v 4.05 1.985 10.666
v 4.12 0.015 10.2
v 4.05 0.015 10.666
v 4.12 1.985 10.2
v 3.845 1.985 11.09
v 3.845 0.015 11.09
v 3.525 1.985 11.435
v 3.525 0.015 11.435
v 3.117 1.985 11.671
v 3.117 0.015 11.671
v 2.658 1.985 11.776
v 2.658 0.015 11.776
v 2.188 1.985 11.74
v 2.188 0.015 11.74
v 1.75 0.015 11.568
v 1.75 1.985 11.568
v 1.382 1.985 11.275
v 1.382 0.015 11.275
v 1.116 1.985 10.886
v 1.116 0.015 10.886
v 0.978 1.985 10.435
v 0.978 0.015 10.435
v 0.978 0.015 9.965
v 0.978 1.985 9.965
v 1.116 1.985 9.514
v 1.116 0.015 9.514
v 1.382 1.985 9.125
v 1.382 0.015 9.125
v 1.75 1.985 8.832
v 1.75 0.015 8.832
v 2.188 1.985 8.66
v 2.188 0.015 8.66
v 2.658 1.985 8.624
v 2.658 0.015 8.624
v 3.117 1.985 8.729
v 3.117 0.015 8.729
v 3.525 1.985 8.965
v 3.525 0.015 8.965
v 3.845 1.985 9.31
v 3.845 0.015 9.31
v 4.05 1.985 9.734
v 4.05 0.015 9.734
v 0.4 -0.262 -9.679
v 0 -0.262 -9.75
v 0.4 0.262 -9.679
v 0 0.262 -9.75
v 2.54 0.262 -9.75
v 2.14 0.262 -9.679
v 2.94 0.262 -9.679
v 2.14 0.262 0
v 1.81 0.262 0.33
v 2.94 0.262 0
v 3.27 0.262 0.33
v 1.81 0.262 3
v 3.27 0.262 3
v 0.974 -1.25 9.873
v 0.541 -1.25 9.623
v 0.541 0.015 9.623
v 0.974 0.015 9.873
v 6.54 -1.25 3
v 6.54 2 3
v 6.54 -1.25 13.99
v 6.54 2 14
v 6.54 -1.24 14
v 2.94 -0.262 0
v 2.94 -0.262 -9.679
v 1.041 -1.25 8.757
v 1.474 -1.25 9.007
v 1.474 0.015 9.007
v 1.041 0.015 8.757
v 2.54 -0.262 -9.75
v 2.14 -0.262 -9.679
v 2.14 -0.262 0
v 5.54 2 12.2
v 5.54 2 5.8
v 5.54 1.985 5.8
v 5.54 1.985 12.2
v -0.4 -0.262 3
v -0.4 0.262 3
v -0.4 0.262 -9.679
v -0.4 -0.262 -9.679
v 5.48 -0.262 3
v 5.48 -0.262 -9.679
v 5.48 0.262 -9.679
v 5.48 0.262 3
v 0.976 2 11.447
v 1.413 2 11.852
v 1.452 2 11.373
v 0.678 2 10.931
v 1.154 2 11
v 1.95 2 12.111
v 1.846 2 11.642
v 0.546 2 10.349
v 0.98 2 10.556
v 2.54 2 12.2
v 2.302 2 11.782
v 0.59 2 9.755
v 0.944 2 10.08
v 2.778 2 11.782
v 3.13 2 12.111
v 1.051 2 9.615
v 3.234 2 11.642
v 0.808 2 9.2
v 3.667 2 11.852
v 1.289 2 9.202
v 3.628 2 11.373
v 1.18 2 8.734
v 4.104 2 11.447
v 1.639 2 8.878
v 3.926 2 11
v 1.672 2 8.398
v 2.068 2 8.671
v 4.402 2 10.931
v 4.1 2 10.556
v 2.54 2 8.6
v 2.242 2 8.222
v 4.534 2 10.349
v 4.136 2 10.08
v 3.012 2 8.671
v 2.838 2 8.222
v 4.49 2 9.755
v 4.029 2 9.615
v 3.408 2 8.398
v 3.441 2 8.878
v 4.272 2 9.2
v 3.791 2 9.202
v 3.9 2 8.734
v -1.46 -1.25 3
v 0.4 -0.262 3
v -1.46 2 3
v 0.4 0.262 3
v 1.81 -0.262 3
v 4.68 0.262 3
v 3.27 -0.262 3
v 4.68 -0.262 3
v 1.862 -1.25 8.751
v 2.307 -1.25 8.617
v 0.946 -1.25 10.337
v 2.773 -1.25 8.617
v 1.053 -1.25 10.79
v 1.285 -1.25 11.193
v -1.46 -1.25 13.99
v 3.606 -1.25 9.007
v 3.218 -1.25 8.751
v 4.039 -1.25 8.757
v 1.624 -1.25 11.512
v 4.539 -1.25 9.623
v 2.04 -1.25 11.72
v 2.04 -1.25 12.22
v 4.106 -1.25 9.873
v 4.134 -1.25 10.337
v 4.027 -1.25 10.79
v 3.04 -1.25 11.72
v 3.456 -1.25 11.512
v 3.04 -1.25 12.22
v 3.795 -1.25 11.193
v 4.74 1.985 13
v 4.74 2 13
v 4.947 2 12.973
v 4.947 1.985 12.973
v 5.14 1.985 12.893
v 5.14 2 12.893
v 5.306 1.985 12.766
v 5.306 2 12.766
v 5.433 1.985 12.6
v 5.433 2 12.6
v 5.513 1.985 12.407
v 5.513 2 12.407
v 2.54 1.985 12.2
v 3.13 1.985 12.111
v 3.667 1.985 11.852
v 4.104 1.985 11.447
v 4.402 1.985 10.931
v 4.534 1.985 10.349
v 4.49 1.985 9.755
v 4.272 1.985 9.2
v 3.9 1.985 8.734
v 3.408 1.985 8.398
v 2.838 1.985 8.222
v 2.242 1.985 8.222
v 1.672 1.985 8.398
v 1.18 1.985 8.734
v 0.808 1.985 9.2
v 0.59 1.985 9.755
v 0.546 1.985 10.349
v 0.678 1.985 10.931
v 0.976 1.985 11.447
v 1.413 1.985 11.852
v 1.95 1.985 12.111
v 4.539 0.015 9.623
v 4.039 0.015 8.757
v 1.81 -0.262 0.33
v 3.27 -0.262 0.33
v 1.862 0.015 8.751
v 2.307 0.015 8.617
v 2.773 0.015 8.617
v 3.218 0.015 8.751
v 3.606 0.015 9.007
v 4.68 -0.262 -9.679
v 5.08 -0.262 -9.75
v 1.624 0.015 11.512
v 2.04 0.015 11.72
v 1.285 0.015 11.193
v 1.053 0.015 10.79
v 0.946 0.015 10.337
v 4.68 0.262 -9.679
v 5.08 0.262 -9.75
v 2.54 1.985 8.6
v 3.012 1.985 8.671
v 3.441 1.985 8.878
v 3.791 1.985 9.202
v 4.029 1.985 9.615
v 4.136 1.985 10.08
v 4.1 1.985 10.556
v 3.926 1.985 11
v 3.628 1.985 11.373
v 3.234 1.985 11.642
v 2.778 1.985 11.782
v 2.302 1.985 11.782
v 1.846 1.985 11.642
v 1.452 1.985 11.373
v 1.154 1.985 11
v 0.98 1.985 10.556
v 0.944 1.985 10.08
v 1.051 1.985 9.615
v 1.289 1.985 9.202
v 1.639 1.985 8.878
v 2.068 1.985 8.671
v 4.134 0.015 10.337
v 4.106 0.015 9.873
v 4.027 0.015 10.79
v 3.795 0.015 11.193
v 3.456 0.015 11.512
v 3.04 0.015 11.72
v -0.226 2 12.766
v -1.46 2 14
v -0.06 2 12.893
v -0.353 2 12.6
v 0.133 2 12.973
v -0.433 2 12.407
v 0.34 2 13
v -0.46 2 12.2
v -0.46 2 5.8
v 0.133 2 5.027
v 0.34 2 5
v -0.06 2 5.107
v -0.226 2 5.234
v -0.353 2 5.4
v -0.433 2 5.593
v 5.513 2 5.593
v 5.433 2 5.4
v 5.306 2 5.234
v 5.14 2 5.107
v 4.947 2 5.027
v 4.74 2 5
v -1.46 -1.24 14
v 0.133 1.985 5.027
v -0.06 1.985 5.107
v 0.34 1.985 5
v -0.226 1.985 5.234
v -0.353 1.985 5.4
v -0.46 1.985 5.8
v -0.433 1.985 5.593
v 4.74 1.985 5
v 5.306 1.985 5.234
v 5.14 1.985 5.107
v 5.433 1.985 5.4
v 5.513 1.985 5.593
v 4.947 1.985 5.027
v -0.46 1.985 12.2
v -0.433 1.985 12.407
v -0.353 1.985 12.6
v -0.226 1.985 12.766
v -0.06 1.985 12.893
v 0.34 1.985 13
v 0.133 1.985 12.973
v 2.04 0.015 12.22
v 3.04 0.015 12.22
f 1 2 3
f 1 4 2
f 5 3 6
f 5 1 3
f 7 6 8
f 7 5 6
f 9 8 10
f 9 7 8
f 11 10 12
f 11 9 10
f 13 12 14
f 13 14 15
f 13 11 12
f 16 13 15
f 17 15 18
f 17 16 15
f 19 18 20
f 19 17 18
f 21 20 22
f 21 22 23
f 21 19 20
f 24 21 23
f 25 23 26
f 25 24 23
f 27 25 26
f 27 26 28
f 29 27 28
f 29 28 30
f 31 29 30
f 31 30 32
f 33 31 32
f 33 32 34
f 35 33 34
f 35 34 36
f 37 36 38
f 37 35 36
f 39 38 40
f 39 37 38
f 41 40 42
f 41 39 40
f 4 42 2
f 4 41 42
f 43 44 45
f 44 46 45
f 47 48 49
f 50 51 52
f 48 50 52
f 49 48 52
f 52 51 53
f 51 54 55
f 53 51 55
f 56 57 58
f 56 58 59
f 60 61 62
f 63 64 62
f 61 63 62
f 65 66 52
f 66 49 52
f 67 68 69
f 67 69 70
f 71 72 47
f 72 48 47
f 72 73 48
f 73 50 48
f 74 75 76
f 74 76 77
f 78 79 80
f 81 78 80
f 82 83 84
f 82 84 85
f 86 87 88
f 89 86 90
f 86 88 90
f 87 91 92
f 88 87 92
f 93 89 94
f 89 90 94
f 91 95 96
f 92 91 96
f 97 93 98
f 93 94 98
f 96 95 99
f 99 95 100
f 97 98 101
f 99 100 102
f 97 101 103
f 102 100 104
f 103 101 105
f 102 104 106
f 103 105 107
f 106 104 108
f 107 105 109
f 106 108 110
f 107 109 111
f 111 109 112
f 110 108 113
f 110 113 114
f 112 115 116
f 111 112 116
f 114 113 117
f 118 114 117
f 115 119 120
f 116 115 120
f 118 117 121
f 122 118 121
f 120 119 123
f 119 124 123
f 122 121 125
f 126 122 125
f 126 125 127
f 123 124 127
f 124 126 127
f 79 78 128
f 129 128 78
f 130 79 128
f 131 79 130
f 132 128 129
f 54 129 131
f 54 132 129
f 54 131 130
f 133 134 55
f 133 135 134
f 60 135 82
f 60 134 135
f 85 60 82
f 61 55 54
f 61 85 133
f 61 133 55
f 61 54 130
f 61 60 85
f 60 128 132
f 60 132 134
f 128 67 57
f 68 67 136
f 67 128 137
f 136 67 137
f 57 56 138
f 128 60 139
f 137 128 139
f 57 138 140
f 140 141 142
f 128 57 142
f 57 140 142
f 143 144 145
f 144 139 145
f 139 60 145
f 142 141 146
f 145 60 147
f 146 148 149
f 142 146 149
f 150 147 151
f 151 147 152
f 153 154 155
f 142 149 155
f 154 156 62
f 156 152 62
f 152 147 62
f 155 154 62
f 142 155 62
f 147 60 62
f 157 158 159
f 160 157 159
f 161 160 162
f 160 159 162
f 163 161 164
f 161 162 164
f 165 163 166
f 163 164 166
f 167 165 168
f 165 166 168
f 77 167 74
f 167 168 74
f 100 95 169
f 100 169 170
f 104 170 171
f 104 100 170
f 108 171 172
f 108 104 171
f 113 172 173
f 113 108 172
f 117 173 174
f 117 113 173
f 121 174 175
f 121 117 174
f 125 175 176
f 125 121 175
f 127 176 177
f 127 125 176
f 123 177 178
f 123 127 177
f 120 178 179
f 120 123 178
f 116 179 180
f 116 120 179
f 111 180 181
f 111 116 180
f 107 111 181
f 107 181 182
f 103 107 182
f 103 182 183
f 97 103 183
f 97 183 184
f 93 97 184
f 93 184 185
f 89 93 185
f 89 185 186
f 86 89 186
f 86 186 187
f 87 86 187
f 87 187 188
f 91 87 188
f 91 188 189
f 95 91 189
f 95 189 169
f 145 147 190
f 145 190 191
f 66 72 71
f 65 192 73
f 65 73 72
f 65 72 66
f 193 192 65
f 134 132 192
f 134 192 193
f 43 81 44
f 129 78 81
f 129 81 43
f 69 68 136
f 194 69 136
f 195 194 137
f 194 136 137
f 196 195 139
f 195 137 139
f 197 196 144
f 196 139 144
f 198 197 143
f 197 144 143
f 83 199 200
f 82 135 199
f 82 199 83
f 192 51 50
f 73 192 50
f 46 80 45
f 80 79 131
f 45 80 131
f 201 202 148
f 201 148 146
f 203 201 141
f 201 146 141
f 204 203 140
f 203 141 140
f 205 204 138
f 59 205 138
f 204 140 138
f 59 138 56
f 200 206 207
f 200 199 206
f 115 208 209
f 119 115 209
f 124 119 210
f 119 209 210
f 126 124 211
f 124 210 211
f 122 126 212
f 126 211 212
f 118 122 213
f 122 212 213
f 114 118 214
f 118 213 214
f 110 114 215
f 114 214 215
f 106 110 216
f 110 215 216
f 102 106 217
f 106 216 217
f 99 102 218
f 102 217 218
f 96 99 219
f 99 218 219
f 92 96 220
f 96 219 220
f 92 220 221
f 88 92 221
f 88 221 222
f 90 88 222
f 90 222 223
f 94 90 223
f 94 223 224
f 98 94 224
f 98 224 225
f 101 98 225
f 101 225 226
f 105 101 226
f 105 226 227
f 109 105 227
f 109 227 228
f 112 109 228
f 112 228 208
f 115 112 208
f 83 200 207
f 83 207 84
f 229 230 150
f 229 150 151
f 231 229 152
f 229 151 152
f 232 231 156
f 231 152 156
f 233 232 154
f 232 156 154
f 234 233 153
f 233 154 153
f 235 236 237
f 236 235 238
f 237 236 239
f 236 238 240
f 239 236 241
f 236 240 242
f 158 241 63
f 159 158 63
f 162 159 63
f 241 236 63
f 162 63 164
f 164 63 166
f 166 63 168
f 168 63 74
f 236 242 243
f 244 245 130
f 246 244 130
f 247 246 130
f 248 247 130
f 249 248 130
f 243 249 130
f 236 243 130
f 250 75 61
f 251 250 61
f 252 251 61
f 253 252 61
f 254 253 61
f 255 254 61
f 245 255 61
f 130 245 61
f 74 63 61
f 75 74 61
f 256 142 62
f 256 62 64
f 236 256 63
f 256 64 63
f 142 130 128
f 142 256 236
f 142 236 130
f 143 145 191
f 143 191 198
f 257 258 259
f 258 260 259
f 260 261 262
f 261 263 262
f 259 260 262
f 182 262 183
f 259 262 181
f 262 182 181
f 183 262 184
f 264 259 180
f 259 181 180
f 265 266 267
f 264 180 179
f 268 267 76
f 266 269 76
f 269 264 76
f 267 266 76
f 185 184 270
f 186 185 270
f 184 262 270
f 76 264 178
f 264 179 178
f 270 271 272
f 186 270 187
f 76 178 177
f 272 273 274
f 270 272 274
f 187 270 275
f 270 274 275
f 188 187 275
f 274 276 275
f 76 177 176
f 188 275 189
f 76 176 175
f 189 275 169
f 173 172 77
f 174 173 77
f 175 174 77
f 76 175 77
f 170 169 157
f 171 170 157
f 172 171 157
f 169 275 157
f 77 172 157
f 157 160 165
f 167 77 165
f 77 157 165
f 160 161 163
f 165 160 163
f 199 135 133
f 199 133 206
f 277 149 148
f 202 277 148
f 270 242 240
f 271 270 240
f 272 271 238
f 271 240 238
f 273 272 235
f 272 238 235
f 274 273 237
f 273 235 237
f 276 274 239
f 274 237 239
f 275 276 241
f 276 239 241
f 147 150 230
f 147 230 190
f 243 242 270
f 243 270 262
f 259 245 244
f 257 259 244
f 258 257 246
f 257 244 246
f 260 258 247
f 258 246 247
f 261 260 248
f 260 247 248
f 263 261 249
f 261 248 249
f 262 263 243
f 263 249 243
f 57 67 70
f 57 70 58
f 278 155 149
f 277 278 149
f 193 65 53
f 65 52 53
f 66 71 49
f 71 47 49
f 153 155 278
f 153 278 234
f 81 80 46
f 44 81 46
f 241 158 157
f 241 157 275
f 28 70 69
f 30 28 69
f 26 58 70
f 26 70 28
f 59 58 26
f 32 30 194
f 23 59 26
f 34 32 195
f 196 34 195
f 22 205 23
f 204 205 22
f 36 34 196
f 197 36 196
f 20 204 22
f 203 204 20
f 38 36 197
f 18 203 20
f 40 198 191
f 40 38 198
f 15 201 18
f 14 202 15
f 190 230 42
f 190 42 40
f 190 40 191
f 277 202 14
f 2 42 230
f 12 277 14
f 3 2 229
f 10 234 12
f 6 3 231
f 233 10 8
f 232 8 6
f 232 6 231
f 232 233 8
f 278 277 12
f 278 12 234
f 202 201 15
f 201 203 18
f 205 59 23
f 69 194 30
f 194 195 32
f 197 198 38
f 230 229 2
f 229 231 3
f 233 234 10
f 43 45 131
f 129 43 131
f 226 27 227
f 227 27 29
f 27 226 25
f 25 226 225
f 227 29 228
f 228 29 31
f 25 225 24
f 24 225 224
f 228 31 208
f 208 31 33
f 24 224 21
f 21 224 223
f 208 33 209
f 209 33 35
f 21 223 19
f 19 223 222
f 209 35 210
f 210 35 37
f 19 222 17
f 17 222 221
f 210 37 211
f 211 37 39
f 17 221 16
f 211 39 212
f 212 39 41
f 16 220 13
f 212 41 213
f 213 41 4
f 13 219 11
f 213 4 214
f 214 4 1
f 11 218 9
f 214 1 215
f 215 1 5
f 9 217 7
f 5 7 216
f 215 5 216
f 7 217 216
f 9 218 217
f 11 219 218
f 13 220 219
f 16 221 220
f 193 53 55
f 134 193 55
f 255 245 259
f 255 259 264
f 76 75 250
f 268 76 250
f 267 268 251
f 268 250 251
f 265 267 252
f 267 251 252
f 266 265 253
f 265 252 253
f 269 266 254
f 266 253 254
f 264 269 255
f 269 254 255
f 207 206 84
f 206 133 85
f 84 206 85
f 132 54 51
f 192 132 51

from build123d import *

# Parameters (mm, degrees)
SKETCH005_W     = 7.4
SKETCH005_H     = 10.4
SKETCH005_R     = 1.58
PAD003_DEPTH    = 0.985
PAD001_DEPTH    = 4
POCKET_DEPTH    = 1.35
SKETCH004_R     = 1.6
POCKET001_DEPTH = 3.251
SKETCH006_R     = 2
POCKET002_DEPTH = 0.02
PAD_DEPTH       = 0.2625


with BuildPart() as pad003:
    # Sketch005 → Pad003 (new body, symmetric)
    with BuildSketch(Plane.XZ.offset(-1)):
        with Locations((2.54, 8.4)):
            Rectangle(SKETCH005_W, SKETCH005_H)
        with Locations((2.54, 10.2)):
            Circle(SKETCH005_R, mode=Mode.SUBTRACT)
    extrude(amount=PAD003_DEPTH, both=True)


with BuildPart() as pocket002:
    # Sketch001 → Pad001 (new body, symmetric)
    with BuildSketch(Plane.YZ.offset(2.54)):
        Polygon((0, 3), (-1.25, 3), (-1.25, 13.99), (-1.24, 14), (2, 14), (2, 3), align=None)
    extrude(amount=PAD001_DEPTH, both=True)

    # Sketch003 → Pocket (cut)
    with BuildSketch(Plane(origin=(2.54, -1.25, 0), x_dir=(0, 0, -1), z_dir=(0, -1, 0))):
        with BuildLine():
            Line((-12.219868, 0.5), (-12.219868, -0.5))
            Line((-12.219868, -0.5), (-11.719868, -0.5))
            ThreePointArc((-11.719868, -0.5), (-11, -1.385641), (-9.873078, -1.566245))
            Line((-9.623078, -1.999257), (-9.873078, -1.566245))
            Line((-8.757053, -1.499257), (-9.623078, -1.999257))
            Line((-9.007053, -1.066245), (-8.757053, -1.499257))
            ThreePointArc((-9.007053, -1.066245), (-8.6, 0), (-9.007053, 1.066245))
            Line((-8.757053, 1.499257), (-9.007053, 1.066245))
            Line((-9.623078, 1.999257), (-8.757053, 1.499257))
            Line((-9.873078, 1.566245), (-9.623078, 1.999257))
            ThreePointArc((-9.873078, 1.566245), (-11, 1.385641), (-11.719868, 0.5))
            Line((-12.219868, 0.5), (-11.719868, 0.5))
        make_face()
    extrude(amount=-POCKET_DEPTH, mode=Mode.SUBTRACT)

    # Sketch004 → Pocket001 (cut, through all)
    with BuildSketch(Plane(origin=(2.54, -1.25, 0), x_dir=(0, 0, -1), z_dir=(0, -1, 0))):
        with Locations((-10.2, 0)):
            Circle(SKETCH004_R)
    extrude(amount=-POCKET001_DEPTH, mode=Mode.SUBTRACT)

    # Sketch006 → Pocket002 (cut)
    with BuildSketch(Plane(origin=(2.54, 2, 0), x_dir=(0, 0, 1), z_dir=(0, 1, 0))):
        with BuildLine():
            Line((5.8, 3), (12.2, 3))
            ThreePointArc((13, 2.2), (12.765685, 2.765685), (12.2, 3))
            Line((13, 2.2), (13, -2.2))
            ThreePointArc((12.2, -3), (12.765685, -2.765685), (13, -2.2))
            Line((12.2, -3), (5.8, -3))
            ThreePointArc((5, -2.2), (5.234315, -2.765685), (5.8, -3))
            Line((5, -2.2), (5, 2.2))
            ThreePointArc((5.8, 3), (5.234315, 2.765685), (5, 2.2))
        make_face()
        with Locations((10.2, 0)):
            Circle(SKETCH006_R, mode=Mode.SUBTRACT)
    extrude(amount=-POCKET002_DEPTH, mode=Mode.SUBTRACT)


with BuildPart() as to_126_3_vertical:
    # Sketch → Pad (new body, symmetric)
    with BuildSketch(Plane.XZ):
        Polygon((-0.4, 0.3025), (-0.4, 0), (-0.4, -9.679469), (0, -9.75), (0.4, -9.679469), (0.4, 0), (0.4, 0.3025), (0.4, 3.73), (-0.4, 3.73), align=None)
        Polygon((1.81, 0.33), (2.14, 0), (2.14, -9.679469), (2.54, -9.75), (2.94, -9.679469), (2.94, 0), (3.27, 0.33), (3.27, 3.73), (1.81, 3.73), align=None)
        Polygon((4.68, 0.3025), (4.68, 0), (4.68, -9.679469), (5.08, -9.75), (5.48, -9.679469), (5.48, 0), (5.48, 0.3025), (5.48, 3.73), (4.68, 3.73), align=None)
    extrude(amount=PAD_DEPTH, both=True)

    # Pad_mp_cp: union Pad003, Pocket002
    add(pad003.part)
    add(pocket002.part)


solid = to_126_3_vertical.part
